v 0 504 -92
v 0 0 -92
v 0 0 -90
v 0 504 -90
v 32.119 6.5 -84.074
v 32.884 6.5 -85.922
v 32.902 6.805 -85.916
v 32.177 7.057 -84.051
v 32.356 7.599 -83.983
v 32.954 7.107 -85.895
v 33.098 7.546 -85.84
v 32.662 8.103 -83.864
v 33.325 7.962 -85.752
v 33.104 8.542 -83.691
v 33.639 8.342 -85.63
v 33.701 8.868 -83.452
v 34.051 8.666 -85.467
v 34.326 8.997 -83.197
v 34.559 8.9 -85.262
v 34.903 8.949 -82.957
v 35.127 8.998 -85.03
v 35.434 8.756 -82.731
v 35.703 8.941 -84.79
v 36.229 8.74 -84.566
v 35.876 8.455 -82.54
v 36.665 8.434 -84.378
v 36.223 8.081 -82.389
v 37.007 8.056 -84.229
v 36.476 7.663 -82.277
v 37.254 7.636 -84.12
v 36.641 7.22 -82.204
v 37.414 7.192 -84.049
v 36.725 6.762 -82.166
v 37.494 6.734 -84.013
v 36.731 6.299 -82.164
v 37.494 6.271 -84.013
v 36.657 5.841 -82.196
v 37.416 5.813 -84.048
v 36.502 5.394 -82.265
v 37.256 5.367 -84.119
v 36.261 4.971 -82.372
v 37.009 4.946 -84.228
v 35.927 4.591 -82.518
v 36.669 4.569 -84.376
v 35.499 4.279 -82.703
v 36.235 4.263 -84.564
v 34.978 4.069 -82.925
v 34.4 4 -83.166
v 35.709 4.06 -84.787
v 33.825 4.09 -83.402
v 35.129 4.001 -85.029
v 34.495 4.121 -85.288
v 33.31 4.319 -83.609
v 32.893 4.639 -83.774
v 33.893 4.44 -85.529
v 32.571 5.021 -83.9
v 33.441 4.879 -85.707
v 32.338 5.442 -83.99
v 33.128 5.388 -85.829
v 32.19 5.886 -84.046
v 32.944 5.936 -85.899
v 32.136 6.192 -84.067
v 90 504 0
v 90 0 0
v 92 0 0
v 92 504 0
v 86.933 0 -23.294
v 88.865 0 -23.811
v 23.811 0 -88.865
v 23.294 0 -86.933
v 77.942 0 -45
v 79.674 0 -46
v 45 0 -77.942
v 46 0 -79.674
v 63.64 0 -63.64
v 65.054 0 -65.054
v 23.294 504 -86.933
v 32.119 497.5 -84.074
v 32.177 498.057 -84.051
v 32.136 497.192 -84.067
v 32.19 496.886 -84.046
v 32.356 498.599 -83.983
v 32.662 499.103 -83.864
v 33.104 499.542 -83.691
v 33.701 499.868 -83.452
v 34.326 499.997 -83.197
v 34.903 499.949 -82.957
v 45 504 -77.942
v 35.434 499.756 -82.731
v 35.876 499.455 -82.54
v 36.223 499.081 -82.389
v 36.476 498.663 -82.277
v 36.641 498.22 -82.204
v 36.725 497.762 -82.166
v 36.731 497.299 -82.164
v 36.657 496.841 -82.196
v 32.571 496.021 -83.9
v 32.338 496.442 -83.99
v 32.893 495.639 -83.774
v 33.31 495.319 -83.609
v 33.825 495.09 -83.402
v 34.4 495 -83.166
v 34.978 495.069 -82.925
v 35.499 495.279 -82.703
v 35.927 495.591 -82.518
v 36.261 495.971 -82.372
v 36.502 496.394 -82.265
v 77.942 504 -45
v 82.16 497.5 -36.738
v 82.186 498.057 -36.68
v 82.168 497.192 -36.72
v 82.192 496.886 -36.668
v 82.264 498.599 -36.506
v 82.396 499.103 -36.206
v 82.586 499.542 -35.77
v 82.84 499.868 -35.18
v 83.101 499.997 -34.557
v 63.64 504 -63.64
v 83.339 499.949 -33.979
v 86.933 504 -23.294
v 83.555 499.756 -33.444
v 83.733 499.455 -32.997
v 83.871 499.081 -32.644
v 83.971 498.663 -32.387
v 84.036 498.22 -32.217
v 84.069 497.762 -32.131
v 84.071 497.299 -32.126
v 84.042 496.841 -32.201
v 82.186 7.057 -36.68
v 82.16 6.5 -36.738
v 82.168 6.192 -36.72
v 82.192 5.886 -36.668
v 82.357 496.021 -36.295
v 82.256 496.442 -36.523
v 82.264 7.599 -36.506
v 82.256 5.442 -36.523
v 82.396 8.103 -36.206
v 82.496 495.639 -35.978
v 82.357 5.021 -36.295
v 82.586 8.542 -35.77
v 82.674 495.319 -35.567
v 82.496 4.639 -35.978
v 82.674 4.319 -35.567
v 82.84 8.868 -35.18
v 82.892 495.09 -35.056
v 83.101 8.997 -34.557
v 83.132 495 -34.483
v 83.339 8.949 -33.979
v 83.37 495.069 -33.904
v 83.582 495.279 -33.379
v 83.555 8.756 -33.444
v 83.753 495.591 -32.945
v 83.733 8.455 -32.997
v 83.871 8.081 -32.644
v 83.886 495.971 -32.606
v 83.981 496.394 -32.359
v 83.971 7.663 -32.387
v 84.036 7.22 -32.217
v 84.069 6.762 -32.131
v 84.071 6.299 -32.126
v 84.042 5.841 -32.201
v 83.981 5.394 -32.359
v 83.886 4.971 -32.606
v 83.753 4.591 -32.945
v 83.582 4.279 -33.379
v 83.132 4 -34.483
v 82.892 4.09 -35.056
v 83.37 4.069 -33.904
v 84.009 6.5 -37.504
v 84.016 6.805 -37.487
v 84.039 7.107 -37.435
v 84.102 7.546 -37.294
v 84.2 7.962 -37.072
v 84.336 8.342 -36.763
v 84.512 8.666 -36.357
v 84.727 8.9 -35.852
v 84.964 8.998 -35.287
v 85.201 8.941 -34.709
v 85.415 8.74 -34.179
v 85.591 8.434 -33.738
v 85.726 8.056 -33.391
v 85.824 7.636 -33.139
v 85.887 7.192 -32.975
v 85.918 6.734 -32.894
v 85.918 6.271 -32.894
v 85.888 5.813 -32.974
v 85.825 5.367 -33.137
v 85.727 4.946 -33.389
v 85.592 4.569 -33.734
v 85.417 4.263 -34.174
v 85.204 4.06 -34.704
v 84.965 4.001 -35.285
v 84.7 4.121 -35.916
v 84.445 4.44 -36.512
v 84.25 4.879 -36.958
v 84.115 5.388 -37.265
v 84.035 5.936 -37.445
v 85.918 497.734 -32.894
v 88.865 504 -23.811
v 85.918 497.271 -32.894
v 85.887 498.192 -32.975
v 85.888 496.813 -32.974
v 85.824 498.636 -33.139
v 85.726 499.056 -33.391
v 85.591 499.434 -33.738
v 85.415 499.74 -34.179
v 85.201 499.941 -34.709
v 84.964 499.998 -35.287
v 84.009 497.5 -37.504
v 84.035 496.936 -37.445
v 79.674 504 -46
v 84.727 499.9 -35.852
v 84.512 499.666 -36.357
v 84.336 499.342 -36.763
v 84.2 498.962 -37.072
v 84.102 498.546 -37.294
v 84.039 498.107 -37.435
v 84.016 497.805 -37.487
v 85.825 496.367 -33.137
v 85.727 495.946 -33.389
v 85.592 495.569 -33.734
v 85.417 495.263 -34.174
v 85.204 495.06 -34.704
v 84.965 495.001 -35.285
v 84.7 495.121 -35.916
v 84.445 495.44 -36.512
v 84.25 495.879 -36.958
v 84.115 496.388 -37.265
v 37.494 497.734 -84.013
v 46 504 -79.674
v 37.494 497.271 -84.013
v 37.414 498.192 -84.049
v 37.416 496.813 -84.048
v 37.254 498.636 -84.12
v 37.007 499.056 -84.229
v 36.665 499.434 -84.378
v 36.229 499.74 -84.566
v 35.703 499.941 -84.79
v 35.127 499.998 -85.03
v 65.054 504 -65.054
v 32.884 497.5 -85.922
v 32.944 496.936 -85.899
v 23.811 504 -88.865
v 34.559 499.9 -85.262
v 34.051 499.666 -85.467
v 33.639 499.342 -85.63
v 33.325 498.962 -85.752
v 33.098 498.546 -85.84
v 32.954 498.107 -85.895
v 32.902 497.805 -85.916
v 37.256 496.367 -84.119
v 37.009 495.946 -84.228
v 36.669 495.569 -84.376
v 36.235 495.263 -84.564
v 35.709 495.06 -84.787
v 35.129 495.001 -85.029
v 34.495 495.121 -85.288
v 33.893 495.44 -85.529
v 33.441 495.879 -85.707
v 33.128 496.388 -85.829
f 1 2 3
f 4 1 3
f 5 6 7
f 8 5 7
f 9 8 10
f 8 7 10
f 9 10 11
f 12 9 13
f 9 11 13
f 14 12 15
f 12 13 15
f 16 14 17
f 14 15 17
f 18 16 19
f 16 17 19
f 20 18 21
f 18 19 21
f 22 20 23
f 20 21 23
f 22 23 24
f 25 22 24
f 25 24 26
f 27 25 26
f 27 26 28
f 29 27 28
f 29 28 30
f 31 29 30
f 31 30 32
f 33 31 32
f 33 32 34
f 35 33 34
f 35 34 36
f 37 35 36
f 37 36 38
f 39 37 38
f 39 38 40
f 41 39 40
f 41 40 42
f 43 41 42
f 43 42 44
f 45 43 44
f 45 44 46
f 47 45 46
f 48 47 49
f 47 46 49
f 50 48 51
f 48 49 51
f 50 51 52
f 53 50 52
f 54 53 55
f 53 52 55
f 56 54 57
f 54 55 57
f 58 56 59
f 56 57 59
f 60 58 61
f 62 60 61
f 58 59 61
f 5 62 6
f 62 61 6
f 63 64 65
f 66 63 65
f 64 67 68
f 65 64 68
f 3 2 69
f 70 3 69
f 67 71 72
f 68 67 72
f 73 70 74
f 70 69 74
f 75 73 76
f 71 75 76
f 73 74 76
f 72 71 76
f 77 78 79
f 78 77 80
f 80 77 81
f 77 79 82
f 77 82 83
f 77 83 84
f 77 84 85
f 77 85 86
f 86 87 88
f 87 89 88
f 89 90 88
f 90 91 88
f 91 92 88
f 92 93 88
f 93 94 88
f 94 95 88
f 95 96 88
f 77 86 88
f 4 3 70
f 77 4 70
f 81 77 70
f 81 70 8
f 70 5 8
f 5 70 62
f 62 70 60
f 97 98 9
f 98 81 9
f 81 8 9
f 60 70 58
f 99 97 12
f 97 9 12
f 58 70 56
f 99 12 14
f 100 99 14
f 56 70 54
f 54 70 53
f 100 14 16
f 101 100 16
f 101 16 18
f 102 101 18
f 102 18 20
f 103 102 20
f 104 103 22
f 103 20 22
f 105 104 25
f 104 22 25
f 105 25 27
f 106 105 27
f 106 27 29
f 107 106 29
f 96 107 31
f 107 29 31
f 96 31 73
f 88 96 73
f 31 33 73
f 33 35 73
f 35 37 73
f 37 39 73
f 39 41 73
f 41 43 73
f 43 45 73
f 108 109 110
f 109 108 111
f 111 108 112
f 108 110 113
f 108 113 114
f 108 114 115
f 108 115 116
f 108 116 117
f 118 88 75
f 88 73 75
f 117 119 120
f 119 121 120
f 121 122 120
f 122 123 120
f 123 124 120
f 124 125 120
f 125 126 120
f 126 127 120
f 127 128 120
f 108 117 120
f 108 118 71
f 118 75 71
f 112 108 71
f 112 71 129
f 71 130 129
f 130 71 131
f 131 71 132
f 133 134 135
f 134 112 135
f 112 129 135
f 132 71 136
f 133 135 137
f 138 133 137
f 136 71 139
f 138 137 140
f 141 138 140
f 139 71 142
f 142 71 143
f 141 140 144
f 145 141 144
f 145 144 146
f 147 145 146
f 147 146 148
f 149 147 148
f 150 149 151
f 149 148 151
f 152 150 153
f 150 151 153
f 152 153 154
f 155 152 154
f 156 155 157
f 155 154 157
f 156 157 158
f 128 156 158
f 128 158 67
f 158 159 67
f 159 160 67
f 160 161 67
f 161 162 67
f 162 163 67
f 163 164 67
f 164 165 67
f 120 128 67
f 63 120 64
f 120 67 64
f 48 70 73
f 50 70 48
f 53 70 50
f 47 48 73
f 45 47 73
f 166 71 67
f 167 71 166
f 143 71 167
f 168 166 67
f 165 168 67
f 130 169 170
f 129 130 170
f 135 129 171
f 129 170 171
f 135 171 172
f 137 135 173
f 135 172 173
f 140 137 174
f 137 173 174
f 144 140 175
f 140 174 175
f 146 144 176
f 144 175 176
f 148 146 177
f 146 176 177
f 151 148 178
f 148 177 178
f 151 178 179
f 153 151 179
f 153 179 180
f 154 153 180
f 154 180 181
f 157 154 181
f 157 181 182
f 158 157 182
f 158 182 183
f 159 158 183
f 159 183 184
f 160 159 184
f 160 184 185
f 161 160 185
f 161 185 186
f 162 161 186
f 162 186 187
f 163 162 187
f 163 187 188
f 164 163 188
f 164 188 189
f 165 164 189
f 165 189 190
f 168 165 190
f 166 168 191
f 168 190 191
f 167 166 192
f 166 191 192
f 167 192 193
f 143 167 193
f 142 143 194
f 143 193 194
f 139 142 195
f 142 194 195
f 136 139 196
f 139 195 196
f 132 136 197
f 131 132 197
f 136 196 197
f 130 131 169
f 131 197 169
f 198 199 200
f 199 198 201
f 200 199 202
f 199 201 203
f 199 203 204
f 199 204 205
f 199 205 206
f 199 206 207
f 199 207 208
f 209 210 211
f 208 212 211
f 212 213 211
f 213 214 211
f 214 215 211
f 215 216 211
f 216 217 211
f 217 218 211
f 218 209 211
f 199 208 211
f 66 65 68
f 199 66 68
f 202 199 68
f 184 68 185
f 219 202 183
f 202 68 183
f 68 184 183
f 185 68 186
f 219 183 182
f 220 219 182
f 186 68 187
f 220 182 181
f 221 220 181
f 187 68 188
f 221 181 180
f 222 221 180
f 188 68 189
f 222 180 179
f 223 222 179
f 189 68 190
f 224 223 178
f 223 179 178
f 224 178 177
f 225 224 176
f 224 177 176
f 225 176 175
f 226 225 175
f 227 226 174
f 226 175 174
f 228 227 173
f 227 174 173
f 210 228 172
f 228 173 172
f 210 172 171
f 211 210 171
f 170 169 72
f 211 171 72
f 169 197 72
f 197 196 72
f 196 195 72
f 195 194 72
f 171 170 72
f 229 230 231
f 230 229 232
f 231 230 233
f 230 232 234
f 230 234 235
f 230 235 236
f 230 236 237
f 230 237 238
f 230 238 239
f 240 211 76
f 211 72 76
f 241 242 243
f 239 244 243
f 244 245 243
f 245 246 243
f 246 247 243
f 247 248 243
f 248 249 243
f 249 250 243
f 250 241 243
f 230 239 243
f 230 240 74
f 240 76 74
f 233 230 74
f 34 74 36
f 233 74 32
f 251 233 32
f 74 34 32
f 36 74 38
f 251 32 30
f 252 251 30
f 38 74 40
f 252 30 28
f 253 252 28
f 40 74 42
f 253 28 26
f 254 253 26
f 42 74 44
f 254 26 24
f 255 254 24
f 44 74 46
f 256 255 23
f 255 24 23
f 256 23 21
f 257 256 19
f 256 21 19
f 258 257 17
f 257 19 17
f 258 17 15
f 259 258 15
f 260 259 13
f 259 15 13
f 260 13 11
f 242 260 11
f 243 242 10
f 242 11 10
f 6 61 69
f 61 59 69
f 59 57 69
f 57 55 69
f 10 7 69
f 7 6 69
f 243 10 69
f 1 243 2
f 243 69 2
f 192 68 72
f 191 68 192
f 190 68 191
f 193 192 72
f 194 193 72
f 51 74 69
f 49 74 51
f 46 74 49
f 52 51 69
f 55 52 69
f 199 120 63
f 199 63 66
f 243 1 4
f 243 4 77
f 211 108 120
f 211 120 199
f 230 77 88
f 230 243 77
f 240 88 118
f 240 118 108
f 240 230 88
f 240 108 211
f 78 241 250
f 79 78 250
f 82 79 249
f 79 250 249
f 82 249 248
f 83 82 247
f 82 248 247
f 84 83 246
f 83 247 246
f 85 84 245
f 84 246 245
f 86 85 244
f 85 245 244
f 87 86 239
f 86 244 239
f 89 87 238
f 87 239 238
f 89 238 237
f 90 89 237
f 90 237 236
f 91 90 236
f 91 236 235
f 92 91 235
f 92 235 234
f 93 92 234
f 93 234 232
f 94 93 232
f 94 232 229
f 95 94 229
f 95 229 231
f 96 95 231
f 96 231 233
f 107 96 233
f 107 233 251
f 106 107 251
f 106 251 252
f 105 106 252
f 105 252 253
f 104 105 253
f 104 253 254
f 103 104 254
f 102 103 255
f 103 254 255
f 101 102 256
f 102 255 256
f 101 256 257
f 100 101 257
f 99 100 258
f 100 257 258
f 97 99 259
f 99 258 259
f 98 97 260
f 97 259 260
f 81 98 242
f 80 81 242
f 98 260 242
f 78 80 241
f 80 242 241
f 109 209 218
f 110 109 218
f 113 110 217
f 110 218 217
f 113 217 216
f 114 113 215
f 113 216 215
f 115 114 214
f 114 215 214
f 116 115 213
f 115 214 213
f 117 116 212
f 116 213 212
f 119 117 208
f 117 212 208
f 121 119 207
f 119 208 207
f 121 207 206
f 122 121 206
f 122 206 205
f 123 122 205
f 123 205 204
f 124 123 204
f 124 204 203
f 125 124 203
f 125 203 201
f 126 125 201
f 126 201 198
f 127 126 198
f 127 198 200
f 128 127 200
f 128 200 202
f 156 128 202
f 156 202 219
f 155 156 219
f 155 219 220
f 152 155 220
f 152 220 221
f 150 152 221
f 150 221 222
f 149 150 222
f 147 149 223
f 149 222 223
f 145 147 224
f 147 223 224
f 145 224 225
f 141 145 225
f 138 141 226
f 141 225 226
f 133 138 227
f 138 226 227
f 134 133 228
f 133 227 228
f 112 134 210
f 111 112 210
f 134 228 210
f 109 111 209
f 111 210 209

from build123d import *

# Parameters (mm, degrees)
BOSS_EXTRUDE1_DEPTH     = 504
CUT_EXTRUDE2_REACH      = 516.263
CUT_EXTRUDE2_END_RADIUS = 90
SKETCH3_R               = 2.5
CUT_EXTRUDE3_REACH      = 516.263
CUT_EXTRUDE3_END_RADIUS = 90
SKETCH5_R               = 2.5
LPATTERN2_COUNT         = 2
LPATTERN2_PITCH         = 491


with BuildPart() as part:
    # Sketch1 → Boss-Extrude1 (new body)
    with BuildSketch(Plane(origin=(0, 0, 0), x_dir=(1, 0, 0), z_dir=(0, 1, 0))):
        with BuildLine():
            Line((0, 92), (0, 90))
            ThreePointArc((0, 90), (63.639610307, 63.639610307), (90, 0))
            Line((90, 0), (92, 0))
            ThreePointArc((92, 0), (65.053823869, 65.053823869), (0, 92))
        make_face()
    extrude(amount=BOSS_EXTRUDE1_DEPTH)

    # Cut-Extrude2: up to this cylinder (the profile starts outside it)
    cut_extrude2_end = Plane(origin=(0, 6.5, 0), z_dir=(0, -1, 0)) * Cylinder(CUT_EXTRUDE2_END_RADIUS, 1213.526, mode=Mode.PRIVATE)
    # Sketch3 → Cut-Extrude2 (cut, up to the surface)
    with BuildSketch(Plane(origin=(84.996916991, 0, -35.206875778), x_dir=(-0.38268343236509045, 0, -0.9238795325112865), z_dir=(0.9238795325112865, 0, -0.38268343236509045)), mode=Mode.PRIVATE) as cut_extrude2_sk1:
        with Locations((0, 6.5)):
            Circle(SKETCH3_R)
    cut_extrude2_tool1 = extrude(cut_extrude2_sk1.sketch, amount=-CUT_EXTRUDE2_REACH, mode=Mode.PRIVATE) - cut_extrude2_end
    cut_extrude2 = cut_extrude2_tool1.solids().sort_by_distance((84.996917, 6.5, -35.206876))[0]
    add(cut_extrude2, mode=Mode.SUBTRACT)

    # Cut-Extrude3: up to this cylinder (the profile starts outside it)
    cut_extrude3_end = Plane(origin=(0, 6.5, 0), z_dir=(0, -1, 0)) * Cylinder(CUT_EXTRUDE3_END_RADIUS, 1213.526, mode=Mode.PRIVATE)
    # Sketch5 → Cut-Extrude3 (cut, up to the surface)
    with BuildSketch(Plane(origin=(35.206875778, 0, -84.996916991), x_dir=(-0.9238795325112878, 0, -0.3826834323650876), z_dir=(0.3826834323650876, 0, -0.9238795325112878)), mode=Mode.PRIVATE) as cut_extrude3_sk1:
        with Locations((0, 6.5)):
            Circle(SKETCH5_R)
    cut_extrude3_tool1 = extrude(cut_extrude3_sk1.sketch, amount=-CUT_EXTRUDE3_REACH, mode=Mode.PRIVATE) - cut_extrude3_end
    cut_extrude3 = cut_extrude3_tool1.solids().sort_by_distance((35.206876, 6.5, -84.996917))[0]
    add(cut_extrude3, mode=Mode.SUBTRACT)

    # LPattern2: Cut-Extrude2, Cut-Extrude3 ×2
    with Locations(*[(0, i * LPATTERN2_PITCH, 0) for i in range(1, LPATTERN2_COUNT)]):
        add(cut_extrude2, mode=Mode.SUBTRACT)
        add(cut_extrude3, mode=Mode.SUBTRACT)


solid = part.part
